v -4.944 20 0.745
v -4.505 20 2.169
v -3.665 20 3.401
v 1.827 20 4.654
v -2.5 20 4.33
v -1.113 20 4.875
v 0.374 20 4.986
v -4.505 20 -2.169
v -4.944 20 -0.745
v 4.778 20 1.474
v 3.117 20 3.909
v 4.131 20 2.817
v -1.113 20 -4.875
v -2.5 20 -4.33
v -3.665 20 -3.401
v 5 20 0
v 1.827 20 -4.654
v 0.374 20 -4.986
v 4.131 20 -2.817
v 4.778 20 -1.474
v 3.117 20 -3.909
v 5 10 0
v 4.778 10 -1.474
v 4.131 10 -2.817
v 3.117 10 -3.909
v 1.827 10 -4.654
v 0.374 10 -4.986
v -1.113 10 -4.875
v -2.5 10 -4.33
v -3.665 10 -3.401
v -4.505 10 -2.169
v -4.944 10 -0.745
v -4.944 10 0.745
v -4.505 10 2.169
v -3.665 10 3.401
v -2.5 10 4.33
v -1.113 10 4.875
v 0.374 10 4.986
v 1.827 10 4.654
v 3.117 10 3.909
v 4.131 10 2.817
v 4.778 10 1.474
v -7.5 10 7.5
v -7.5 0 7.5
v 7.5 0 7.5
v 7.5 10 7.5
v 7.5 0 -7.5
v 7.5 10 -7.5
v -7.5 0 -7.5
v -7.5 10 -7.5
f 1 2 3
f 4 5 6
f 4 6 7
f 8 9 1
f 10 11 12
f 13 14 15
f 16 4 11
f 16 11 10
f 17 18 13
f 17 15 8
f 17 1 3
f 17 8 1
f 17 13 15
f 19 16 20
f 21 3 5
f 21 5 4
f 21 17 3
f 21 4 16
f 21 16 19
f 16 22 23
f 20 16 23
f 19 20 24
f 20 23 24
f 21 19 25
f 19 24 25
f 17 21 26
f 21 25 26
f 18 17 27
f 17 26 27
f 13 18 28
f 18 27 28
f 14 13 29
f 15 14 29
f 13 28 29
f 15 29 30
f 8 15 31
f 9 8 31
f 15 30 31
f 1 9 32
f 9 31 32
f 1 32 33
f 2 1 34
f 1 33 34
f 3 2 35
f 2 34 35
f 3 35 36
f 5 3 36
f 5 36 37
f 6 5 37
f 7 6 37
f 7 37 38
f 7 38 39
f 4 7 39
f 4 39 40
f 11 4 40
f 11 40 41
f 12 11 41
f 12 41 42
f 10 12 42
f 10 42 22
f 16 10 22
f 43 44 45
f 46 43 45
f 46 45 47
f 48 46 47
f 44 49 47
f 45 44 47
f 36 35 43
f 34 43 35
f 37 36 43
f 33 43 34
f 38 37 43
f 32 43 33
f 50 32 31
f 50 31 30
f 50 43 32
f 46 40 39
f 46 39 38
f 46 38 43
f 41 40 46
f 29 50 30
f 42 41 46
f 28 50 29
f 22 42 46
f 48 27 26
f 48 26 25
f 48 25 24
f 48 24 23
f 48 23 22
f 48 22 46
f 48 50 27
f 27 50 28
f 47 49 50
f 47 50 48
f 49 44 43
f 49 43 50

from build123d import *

# Parameters (mm, degrees)
SZKIC2_R                    = 5
DODANIE_WYCI_GNI_CIE1_DEPTH = 20
SZKIC2_3_W                  = 15
SZKIC2_3_H                  = 15
SZKIC2_3_R                  = 5
DODANIE_WYCI_GNI_CIE2_DEPTH = 10


with BuildPart() as part:
    # Szkic2 → Dodanie-wyci_gni_cie1 (new body)
    with BuildSketch(Plane(origin=(0, 0, 0), x_dir=(1, 0, 0), z_dir=(0, 1, 0))):
        Circle(SZKIC2_R)
    extrude(amount=DODANIE_WYCI_GNI_CIE1_DEPTH)

    # Szkic2_3 → Dodanie-wyci_gni_cie2 (add)
    with BuildSketch(Plane(origin=(0, 0, 0), x_dir=(1, 0, 0), z_dir=(0, 1, 0))):
        Rectangle(SZKIC2_3_W, SZKIC2_3_H)
        Circle(SZKIC2_3_R, mode=Mode.SUBTRACT)
    extrude(amount=DODANIE_WYCI_GNI_CIE2_DEPTH)


solid = part.part
